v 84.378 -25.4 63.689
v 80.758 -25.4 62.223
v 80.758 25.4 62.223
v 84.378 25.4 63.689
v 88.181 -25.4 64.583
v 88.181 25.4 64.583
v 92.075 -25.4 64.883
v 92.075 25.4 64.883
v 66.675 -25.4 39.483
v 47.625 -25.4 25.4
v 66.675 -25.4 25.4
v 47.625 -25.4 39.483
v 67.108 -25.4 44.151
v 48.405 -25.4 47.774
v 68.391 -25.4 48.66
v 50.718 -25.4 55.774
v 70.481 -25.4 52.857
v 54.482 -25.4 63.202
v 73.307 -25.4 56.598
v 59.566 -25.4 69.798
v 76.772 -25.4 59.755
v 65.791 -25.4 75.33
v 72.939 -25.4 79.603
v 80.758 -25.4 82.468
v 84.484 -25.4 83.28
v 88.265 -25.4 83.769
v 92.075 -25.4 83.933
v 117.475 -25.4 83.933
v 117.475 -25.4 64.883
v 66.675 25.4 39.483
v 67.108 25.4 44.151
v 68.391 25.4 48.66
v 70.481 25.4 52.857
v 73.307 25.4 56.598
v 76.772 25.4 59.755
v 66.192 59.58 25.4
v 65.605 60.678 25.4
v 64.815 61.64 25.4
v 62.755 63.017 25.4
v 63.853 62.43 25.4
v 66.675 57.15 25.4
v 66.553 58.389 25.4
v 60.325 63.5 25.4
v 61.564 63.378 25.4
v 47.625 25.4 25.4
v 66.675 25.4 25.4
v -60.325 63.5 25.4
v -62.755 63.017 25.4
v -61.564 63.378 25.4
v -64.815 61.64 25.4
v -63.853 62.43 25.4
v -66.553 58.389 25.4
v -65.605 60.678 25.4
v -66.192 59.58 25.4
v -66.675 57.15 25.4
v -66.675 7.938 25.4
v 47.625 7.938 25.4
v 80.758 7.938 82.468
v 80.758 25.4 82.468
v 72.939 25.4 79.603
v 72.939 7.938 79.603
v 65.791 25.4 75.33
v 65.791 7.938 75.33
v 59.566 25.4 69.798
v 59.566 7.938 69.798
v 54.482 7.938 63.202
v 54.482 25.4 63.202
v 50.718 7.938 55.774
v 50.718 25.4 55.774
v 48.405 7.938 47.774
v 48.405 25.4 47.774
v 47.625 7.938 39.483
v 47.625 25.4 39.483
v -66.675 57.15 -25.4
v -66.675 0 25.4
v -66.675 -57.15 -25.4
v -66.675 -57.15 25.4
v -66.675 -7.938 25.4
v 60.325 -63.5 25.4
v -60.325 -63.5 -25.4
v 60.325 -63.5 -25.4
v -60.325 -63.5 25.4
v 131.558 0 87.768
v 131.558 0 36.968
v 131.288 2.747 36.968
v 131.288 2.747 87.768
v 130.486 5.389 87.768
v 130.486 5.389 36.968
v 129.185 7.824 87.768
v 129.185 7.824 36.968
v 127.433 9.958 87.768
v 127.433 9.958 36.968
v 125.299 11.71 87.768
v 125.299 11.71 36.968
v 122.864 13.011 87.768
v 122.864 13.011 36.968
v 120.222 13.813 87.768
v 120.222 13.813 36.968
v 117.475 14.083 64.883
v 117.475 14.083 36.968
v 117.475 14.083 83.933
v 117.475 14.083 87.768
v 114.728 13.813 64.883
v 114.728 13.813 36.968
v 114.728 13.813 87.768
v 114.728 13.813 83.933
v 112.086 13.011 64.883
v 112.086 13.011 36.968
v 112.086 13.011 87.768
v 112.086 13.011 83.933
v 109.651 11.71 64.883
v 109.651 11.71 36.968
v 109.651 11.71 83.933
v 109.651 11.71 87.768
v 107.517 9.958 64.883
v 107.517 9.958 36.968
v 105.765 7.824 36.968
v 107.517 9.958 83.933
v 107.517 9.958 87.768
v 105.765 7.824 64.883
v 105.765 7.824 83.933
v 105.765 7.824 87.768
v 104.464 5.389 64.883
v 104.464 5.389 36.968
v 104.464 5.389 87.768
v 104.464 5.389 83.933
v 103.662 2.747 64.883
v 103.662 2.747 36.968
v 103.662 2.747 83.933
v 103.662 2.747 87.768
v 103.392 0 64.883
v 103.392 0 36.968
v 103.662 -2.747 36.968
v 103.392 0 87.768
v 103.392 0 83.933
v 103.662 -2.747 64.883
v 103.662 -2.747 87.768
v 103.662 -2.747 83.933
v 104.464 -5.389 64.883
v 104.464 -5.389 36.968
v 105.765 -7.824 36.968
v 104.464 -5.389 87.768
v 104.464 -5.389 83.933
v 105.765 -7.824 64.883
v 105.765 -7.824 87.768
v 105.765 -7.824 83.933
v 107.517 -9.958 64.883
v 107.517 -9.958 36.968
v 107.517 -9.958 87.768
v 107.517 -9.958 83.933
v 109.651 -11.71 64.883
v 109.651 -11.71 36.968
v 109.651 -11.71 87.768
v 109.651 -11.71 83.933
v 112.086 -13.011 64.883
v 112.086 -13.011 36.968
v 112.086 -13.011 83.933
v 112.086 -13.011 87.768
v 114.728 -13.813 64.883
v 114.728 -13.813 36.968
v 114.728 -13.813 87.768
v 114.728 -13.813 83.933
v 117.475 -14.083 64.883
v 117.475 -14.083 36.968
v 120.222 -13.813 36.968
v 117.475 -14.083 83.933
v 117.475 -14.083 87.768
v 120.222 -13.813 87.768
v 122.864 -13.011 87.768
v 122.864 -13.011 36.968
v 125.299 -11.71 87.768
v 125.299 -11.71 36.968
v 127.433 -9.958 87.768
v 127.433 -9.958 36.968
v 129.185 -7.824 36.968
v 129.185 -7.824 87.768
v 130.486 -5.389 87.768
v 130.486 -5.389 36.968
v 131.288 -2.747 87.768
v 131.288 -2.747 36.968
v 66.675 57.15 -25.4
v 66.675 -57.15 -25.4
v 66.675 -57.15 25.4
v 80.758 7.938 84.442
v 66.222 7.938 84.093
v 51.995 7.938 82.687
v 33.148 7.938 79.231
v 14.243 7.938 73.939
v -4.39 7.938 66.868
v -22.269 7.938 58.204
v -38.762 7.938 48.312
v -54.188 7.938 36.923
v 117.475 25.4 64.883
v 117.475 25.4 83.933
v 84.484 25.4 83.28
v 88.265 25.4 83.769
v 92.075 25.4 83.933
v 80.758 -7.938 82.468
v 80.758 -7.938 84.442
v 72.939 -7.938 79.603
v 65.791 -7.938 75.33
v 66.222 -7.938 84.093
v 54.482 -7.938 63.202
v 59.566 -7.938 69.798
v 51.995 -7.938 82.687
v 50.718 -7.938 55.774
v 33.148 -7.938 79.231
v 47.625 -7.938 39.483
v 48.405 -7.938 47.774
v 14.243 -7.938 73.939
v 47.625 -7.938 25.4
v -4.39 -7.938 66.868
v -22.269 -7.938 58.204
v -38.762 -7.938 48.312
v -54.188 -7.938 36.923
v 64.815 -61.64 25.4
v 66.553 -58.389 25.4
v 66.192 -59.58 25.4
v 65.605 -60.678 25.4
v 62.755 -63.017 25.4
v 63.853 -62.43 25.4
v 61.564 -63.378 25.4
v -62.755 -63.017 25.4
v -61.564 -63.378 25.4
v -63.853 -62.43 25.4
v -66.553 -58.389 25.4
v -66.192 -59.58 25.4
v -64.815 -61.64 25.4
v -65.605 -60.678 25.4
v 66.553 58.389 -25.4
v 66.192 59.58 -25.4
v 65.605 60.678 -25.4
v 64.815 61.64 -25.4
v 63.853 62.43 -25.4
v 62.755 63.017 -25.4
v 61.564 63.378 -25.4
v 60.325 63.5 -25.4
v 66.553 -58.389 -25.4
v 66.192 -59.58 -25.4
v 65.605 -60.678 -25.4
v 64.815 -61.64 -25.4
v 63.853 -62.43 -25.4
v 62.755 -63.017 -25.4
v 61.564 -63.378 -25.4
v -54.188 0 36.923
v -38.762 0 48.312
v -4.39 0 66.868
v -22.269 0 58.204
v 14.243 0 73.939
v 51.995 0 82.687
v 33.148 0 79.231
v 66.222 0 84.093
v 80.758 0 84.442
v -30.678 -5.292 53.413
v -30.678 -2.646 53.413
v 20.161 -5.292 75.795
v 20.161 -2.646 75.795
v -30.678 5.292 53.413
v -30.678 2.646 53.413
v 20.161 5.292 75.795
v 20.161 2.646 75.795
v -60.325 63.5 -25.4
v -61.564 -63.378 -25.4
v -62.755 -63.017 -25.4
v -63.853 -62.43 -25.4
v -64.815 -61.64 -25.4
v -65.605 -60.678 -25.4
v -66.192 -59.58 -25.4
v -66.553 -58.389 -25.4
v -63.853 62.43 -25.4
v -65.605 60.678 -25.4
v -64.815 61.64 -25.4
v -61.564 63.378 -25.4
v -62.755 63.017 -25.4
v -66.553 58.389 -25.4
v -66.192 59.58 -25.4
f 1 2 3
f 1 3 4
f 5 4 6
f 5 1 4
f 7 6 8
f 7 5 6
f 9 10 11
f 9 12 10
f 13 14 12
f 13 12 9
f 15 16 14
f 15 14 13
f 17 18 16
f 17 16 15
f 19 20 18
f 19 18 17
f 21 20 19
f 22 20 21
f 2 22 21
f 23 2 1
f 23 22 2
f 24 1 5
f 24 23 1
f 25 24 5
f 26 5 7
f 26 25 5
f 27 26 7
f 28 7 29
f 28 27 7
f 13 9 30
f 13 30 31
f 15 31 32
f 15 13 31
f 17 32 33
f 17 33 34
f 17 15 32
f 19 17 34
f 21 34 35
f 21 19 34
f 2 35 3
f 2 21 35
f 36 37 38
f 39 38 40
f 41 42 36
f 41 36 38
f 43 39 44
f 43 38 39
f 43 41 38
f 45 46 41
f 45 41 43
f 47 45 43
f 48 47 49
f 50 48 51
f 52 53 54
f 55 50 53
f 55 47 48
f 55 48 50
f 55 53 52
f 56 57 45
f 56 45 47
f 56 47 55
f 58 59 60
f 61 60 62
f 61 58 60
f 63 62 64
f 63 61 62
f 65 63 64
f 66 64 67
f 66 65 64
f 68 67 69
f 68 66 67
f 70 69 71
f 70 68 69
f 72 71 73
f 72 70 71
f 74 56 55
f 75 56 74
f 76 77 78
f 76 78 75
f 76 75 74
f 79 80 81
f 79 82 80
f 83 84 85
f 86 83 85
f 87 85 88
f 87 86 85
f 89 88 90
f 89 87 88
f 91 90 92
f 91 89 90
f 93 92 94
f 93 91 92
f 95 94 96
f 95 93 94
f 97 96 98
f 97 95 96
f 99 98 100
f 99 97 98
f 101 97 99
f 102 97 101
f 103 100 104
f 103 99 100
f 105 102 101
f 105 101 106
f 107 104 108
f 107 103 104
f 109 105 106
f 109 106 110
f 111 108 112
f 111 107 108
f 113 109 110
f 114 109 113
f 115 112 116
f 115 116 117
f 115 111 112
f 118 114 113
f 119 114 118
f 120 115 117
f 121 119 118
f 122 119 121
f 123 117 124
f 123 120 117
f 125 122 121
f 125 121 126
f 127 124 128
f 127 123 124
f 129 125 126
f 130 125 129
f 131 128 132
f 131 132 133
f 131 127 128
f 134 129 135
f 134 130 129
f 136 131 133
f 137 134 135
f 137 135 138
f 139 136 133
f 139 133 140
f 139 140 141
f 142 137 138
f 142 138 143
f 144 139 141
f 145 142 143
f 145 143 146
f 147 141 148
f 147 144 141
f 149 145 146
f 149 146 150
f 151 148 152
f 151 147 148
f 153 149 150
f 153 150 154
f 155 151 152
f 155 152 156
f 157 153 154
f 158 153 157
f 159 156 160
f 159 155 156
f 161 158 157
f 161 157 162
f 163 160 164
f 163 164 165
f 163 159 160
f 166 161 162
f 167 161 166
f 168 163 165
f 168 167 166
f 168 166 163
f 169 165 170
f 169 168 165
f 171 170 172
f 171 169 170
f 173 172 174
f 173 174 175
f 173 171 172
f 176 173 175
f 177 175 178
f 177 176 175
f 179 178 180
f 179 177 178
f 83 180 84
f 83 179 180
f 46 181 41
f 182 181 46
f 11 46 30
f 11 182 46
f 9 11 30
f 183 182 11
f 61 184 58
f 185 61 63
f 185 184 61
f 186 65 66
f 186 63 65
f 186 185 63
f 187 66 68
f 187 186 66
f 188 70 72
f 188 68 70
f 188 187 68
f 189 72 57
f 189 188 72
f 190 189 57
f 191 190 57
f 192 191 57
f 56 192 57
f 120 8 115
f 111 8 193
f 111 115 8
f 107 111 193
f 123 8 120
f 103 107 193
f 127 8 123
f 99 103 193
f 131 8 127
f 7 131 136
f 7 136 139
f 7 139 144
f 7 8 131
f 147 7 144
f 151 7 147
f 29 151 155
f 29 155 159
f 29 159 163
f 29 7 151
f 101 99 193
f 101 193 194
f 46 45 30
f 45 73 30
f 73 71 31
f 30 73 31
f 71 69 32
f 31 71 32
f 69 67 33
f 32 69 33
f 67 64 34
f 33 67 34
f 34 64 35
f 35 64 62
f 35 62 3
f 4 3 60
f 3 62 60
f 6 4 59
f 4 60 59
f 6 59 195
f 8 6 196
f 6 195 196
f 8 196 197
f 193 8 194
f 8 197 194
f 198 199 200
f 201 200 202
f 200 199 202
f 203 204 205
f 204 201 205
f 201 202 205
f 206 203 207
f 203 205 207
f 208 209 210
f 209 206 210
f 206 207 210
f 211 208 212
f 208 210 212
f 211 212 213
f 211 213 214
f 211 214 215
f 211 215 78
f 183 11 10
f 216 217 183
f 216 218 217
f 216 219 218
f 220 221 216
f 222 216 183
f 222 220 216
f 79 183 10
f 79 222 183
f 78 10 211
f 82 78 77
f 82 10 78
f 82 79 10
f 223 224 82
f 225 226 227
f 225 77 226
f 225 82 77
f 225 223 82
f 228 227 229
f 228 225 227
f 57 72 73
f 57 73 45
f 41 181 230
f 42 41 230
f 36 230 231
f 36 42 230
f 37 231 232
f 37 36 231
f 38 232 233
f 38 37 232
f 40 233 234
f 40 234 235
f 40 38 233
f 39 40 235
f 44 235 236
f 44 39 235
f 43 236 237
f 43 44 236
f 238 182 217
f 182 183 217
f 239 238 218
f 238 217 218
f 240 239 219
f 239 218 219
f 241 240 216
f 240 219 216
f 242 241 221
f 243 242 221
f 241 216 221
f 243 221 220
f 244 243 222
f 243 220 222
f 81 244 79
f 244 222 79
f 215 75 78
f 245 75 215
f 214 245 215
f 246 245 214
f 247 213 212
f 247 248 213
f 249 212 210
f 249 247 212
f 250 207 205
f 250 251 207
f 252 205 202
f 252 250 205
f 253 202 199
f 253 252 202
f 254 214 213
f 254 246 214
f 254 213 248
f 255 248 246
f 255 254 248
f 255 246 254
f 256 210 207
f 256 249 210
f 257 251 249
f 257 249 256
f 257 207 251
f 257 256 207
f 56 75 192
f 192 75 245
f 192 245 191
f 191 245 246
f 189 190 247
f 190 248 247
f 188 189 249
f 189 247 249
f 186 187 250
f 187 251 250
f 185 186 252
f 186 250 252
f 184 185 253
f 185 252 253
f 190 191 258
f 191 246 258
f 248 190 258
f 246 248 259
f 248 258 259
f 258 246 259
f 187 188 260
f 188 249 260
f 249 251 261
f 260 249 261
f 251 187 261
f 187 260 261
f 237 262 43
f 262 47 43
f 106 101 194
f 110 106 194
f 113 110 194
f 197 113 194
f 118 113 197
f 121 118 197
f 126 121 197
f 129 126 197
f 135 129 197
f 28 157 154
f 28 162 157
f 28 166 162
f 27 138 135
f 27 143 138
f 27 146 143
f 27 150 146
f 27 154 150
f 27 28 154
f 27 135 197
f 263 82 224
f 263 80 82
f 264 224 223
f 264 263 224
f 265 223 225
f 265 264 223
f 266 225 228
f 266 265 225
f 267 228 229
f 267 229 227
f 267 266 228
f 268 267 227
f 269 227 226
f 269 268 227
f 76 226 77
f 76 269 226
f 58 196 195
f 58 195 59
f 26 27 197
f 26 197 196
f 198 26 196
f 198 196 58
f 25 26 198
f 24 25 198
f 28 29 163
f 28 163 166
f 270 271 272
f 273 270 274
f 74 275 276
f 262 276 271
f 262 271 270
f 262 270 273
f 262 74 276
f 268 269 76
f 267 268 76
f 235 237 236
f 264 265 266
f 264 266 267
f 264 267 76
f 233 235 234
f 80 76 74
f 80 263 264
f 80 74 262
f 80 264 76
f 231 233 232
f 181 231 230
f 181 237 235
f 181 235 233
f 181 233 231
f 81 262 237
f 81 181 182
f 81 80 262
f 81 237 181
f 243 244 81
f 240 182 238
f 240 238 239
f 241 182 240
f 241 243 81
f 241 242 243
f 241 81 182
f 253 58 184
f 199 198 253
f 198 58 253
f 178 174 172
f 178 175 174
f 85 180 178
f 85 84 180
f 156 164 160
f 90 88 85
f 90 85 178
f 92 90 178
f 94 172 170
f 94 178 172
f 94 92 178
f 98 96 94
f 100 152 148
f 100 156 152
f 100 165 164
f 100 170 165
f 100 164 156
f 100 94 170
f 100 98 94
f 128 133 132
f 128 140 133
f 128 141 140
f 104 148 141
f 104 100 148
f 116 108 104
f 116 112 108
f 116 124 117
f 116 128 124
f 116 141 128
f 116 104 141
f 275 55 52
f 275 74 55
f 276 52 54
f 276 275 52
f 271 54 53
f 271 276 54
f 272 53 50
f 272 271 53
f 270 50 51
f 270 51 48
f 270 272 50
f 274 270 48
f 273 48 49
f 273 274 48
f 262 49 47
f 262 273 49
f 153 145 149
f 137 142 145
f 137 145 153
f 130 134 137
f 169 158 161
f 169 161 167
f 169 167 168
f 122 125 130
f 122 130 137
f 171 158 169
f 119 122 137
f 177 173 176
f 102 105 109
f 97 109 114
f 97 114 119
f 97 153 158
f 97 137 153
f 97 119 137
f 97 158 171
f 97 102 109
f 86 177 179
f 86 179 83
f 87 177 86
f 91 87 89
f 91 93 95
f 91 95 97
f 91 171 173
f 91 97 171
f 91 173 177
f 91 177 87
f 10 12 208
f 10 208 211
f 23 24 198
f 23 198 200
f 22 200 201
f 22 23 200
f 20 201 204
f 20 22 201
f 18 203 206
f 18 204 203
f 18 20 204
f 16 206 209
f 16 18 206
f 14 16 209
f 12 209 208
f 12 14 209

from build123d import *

# Parameters (mm, degrees)
F1_DEPTH = 63.5
F2_DEPTH = 25.4
F3_DEPTH = 7.9375
F5_R     = 6.35


with BuildPart() as f1:
    # F0 (on Front) → F1 (new body, symmetric)
    with BuildSketch(Plane.XZ):
        Polygon((-66.675, 25.4), (-66.675, -25.4), (66.675, -25.4), (66.675, 25.4), (47.625, 25.4), align=None)
    extrude(amount=F1_DEPTH, both=True)

    # F0 (on Front) → F2 (join, symmetric)
    with BuildSketch(Plane.XZ):
        with BuildLine():
            Line((47.625, 25.4), (66.675, 25.4))
            Line((66.675, 25.4), (66.675, 39.48301))
            ThreePointArc((66.675, 39.48301), (70.480936, 52.85673), (80.75818, 62.222614))
            Line((80.75818, 62.222614), (80.75818, 82.468264))
            ThreePointArc((80.75818, 82.468264), (56.869637, 66.619423), (47.625, 39.48301))
            Line((47.625, 39.48301), (47.625, 25.4))
        make_face()
        with BuildLine():
            ThreePointArc((92.075, 83.93301), (86.369391, 83.565303), (80.75818, 82.468264))
            Line((80.75818, 82.468264), (80.75818, 62.222614))
            ThreePointArc((80.75818, 62.222614), (86.262339, 64.208967), (92.075, 64.88301))
            Line((92.075, 64.88301), (117.475, 64.88301))
            Line((117.475, 64.88301), (117.475, 83.93301))
            Line((117.475, 83.93301), (92.075, 83.93301))
        make_face()
    extrude(amount=F2_DEPTH, both=True)

    # F0 (on Front) → F3 (join, symmetric)
    with BuildSketch(Plane.XZ):
        with BuildLine():
            add(Edge.make_bspline(
                [(-66.675, 25.4), (-39.794628, 53.528536), (16.976637, 85.362046), (80.75818, 84.44223)],
                knots=[0, 0, 0, 0, 159.802658, 159.802658, 159.802658, 159.802658], degree=3))
            Line((-66.675, 25.4), (47.625, 25.4))
            Line((47.625, 25.4), (47.625, 39.48301))
            ThreePointArc((47.625, 39.48301), (56.869637, 66.619423), (80.75818, 82.468264))
            Line((80.75818, 82.468264), (80.75818, 84.44223))
        make_face()
    extrude(amount=F3_DEPTH, both=True)

    # F0 (on Front) → F4 (revolve)
    with BuildSketch(Plane.XZ):
        Polygon((131.55818, 87.768322), (117.475, 87.768322), (117.475, 83.93301), (117.475, 64.88301), (117.475, 36.968322), (131.55818, 36.968322), align=None)
    revolve(axis=Axis((117.475, 0, 62.368322), (0, 0, 1)))

    # F5
    f5_edges = [f1.edges().sort_by_distance(p)[0] for p in [
        (-66.675, -63.5, 0),
        (66.675, -63.5, 0),
        (66.675, 63.5, 0),
        (-66.675, 63.5, 0),
    ]]
    fillet(f5_edges, radius=F5_R)


solid = f1.part
